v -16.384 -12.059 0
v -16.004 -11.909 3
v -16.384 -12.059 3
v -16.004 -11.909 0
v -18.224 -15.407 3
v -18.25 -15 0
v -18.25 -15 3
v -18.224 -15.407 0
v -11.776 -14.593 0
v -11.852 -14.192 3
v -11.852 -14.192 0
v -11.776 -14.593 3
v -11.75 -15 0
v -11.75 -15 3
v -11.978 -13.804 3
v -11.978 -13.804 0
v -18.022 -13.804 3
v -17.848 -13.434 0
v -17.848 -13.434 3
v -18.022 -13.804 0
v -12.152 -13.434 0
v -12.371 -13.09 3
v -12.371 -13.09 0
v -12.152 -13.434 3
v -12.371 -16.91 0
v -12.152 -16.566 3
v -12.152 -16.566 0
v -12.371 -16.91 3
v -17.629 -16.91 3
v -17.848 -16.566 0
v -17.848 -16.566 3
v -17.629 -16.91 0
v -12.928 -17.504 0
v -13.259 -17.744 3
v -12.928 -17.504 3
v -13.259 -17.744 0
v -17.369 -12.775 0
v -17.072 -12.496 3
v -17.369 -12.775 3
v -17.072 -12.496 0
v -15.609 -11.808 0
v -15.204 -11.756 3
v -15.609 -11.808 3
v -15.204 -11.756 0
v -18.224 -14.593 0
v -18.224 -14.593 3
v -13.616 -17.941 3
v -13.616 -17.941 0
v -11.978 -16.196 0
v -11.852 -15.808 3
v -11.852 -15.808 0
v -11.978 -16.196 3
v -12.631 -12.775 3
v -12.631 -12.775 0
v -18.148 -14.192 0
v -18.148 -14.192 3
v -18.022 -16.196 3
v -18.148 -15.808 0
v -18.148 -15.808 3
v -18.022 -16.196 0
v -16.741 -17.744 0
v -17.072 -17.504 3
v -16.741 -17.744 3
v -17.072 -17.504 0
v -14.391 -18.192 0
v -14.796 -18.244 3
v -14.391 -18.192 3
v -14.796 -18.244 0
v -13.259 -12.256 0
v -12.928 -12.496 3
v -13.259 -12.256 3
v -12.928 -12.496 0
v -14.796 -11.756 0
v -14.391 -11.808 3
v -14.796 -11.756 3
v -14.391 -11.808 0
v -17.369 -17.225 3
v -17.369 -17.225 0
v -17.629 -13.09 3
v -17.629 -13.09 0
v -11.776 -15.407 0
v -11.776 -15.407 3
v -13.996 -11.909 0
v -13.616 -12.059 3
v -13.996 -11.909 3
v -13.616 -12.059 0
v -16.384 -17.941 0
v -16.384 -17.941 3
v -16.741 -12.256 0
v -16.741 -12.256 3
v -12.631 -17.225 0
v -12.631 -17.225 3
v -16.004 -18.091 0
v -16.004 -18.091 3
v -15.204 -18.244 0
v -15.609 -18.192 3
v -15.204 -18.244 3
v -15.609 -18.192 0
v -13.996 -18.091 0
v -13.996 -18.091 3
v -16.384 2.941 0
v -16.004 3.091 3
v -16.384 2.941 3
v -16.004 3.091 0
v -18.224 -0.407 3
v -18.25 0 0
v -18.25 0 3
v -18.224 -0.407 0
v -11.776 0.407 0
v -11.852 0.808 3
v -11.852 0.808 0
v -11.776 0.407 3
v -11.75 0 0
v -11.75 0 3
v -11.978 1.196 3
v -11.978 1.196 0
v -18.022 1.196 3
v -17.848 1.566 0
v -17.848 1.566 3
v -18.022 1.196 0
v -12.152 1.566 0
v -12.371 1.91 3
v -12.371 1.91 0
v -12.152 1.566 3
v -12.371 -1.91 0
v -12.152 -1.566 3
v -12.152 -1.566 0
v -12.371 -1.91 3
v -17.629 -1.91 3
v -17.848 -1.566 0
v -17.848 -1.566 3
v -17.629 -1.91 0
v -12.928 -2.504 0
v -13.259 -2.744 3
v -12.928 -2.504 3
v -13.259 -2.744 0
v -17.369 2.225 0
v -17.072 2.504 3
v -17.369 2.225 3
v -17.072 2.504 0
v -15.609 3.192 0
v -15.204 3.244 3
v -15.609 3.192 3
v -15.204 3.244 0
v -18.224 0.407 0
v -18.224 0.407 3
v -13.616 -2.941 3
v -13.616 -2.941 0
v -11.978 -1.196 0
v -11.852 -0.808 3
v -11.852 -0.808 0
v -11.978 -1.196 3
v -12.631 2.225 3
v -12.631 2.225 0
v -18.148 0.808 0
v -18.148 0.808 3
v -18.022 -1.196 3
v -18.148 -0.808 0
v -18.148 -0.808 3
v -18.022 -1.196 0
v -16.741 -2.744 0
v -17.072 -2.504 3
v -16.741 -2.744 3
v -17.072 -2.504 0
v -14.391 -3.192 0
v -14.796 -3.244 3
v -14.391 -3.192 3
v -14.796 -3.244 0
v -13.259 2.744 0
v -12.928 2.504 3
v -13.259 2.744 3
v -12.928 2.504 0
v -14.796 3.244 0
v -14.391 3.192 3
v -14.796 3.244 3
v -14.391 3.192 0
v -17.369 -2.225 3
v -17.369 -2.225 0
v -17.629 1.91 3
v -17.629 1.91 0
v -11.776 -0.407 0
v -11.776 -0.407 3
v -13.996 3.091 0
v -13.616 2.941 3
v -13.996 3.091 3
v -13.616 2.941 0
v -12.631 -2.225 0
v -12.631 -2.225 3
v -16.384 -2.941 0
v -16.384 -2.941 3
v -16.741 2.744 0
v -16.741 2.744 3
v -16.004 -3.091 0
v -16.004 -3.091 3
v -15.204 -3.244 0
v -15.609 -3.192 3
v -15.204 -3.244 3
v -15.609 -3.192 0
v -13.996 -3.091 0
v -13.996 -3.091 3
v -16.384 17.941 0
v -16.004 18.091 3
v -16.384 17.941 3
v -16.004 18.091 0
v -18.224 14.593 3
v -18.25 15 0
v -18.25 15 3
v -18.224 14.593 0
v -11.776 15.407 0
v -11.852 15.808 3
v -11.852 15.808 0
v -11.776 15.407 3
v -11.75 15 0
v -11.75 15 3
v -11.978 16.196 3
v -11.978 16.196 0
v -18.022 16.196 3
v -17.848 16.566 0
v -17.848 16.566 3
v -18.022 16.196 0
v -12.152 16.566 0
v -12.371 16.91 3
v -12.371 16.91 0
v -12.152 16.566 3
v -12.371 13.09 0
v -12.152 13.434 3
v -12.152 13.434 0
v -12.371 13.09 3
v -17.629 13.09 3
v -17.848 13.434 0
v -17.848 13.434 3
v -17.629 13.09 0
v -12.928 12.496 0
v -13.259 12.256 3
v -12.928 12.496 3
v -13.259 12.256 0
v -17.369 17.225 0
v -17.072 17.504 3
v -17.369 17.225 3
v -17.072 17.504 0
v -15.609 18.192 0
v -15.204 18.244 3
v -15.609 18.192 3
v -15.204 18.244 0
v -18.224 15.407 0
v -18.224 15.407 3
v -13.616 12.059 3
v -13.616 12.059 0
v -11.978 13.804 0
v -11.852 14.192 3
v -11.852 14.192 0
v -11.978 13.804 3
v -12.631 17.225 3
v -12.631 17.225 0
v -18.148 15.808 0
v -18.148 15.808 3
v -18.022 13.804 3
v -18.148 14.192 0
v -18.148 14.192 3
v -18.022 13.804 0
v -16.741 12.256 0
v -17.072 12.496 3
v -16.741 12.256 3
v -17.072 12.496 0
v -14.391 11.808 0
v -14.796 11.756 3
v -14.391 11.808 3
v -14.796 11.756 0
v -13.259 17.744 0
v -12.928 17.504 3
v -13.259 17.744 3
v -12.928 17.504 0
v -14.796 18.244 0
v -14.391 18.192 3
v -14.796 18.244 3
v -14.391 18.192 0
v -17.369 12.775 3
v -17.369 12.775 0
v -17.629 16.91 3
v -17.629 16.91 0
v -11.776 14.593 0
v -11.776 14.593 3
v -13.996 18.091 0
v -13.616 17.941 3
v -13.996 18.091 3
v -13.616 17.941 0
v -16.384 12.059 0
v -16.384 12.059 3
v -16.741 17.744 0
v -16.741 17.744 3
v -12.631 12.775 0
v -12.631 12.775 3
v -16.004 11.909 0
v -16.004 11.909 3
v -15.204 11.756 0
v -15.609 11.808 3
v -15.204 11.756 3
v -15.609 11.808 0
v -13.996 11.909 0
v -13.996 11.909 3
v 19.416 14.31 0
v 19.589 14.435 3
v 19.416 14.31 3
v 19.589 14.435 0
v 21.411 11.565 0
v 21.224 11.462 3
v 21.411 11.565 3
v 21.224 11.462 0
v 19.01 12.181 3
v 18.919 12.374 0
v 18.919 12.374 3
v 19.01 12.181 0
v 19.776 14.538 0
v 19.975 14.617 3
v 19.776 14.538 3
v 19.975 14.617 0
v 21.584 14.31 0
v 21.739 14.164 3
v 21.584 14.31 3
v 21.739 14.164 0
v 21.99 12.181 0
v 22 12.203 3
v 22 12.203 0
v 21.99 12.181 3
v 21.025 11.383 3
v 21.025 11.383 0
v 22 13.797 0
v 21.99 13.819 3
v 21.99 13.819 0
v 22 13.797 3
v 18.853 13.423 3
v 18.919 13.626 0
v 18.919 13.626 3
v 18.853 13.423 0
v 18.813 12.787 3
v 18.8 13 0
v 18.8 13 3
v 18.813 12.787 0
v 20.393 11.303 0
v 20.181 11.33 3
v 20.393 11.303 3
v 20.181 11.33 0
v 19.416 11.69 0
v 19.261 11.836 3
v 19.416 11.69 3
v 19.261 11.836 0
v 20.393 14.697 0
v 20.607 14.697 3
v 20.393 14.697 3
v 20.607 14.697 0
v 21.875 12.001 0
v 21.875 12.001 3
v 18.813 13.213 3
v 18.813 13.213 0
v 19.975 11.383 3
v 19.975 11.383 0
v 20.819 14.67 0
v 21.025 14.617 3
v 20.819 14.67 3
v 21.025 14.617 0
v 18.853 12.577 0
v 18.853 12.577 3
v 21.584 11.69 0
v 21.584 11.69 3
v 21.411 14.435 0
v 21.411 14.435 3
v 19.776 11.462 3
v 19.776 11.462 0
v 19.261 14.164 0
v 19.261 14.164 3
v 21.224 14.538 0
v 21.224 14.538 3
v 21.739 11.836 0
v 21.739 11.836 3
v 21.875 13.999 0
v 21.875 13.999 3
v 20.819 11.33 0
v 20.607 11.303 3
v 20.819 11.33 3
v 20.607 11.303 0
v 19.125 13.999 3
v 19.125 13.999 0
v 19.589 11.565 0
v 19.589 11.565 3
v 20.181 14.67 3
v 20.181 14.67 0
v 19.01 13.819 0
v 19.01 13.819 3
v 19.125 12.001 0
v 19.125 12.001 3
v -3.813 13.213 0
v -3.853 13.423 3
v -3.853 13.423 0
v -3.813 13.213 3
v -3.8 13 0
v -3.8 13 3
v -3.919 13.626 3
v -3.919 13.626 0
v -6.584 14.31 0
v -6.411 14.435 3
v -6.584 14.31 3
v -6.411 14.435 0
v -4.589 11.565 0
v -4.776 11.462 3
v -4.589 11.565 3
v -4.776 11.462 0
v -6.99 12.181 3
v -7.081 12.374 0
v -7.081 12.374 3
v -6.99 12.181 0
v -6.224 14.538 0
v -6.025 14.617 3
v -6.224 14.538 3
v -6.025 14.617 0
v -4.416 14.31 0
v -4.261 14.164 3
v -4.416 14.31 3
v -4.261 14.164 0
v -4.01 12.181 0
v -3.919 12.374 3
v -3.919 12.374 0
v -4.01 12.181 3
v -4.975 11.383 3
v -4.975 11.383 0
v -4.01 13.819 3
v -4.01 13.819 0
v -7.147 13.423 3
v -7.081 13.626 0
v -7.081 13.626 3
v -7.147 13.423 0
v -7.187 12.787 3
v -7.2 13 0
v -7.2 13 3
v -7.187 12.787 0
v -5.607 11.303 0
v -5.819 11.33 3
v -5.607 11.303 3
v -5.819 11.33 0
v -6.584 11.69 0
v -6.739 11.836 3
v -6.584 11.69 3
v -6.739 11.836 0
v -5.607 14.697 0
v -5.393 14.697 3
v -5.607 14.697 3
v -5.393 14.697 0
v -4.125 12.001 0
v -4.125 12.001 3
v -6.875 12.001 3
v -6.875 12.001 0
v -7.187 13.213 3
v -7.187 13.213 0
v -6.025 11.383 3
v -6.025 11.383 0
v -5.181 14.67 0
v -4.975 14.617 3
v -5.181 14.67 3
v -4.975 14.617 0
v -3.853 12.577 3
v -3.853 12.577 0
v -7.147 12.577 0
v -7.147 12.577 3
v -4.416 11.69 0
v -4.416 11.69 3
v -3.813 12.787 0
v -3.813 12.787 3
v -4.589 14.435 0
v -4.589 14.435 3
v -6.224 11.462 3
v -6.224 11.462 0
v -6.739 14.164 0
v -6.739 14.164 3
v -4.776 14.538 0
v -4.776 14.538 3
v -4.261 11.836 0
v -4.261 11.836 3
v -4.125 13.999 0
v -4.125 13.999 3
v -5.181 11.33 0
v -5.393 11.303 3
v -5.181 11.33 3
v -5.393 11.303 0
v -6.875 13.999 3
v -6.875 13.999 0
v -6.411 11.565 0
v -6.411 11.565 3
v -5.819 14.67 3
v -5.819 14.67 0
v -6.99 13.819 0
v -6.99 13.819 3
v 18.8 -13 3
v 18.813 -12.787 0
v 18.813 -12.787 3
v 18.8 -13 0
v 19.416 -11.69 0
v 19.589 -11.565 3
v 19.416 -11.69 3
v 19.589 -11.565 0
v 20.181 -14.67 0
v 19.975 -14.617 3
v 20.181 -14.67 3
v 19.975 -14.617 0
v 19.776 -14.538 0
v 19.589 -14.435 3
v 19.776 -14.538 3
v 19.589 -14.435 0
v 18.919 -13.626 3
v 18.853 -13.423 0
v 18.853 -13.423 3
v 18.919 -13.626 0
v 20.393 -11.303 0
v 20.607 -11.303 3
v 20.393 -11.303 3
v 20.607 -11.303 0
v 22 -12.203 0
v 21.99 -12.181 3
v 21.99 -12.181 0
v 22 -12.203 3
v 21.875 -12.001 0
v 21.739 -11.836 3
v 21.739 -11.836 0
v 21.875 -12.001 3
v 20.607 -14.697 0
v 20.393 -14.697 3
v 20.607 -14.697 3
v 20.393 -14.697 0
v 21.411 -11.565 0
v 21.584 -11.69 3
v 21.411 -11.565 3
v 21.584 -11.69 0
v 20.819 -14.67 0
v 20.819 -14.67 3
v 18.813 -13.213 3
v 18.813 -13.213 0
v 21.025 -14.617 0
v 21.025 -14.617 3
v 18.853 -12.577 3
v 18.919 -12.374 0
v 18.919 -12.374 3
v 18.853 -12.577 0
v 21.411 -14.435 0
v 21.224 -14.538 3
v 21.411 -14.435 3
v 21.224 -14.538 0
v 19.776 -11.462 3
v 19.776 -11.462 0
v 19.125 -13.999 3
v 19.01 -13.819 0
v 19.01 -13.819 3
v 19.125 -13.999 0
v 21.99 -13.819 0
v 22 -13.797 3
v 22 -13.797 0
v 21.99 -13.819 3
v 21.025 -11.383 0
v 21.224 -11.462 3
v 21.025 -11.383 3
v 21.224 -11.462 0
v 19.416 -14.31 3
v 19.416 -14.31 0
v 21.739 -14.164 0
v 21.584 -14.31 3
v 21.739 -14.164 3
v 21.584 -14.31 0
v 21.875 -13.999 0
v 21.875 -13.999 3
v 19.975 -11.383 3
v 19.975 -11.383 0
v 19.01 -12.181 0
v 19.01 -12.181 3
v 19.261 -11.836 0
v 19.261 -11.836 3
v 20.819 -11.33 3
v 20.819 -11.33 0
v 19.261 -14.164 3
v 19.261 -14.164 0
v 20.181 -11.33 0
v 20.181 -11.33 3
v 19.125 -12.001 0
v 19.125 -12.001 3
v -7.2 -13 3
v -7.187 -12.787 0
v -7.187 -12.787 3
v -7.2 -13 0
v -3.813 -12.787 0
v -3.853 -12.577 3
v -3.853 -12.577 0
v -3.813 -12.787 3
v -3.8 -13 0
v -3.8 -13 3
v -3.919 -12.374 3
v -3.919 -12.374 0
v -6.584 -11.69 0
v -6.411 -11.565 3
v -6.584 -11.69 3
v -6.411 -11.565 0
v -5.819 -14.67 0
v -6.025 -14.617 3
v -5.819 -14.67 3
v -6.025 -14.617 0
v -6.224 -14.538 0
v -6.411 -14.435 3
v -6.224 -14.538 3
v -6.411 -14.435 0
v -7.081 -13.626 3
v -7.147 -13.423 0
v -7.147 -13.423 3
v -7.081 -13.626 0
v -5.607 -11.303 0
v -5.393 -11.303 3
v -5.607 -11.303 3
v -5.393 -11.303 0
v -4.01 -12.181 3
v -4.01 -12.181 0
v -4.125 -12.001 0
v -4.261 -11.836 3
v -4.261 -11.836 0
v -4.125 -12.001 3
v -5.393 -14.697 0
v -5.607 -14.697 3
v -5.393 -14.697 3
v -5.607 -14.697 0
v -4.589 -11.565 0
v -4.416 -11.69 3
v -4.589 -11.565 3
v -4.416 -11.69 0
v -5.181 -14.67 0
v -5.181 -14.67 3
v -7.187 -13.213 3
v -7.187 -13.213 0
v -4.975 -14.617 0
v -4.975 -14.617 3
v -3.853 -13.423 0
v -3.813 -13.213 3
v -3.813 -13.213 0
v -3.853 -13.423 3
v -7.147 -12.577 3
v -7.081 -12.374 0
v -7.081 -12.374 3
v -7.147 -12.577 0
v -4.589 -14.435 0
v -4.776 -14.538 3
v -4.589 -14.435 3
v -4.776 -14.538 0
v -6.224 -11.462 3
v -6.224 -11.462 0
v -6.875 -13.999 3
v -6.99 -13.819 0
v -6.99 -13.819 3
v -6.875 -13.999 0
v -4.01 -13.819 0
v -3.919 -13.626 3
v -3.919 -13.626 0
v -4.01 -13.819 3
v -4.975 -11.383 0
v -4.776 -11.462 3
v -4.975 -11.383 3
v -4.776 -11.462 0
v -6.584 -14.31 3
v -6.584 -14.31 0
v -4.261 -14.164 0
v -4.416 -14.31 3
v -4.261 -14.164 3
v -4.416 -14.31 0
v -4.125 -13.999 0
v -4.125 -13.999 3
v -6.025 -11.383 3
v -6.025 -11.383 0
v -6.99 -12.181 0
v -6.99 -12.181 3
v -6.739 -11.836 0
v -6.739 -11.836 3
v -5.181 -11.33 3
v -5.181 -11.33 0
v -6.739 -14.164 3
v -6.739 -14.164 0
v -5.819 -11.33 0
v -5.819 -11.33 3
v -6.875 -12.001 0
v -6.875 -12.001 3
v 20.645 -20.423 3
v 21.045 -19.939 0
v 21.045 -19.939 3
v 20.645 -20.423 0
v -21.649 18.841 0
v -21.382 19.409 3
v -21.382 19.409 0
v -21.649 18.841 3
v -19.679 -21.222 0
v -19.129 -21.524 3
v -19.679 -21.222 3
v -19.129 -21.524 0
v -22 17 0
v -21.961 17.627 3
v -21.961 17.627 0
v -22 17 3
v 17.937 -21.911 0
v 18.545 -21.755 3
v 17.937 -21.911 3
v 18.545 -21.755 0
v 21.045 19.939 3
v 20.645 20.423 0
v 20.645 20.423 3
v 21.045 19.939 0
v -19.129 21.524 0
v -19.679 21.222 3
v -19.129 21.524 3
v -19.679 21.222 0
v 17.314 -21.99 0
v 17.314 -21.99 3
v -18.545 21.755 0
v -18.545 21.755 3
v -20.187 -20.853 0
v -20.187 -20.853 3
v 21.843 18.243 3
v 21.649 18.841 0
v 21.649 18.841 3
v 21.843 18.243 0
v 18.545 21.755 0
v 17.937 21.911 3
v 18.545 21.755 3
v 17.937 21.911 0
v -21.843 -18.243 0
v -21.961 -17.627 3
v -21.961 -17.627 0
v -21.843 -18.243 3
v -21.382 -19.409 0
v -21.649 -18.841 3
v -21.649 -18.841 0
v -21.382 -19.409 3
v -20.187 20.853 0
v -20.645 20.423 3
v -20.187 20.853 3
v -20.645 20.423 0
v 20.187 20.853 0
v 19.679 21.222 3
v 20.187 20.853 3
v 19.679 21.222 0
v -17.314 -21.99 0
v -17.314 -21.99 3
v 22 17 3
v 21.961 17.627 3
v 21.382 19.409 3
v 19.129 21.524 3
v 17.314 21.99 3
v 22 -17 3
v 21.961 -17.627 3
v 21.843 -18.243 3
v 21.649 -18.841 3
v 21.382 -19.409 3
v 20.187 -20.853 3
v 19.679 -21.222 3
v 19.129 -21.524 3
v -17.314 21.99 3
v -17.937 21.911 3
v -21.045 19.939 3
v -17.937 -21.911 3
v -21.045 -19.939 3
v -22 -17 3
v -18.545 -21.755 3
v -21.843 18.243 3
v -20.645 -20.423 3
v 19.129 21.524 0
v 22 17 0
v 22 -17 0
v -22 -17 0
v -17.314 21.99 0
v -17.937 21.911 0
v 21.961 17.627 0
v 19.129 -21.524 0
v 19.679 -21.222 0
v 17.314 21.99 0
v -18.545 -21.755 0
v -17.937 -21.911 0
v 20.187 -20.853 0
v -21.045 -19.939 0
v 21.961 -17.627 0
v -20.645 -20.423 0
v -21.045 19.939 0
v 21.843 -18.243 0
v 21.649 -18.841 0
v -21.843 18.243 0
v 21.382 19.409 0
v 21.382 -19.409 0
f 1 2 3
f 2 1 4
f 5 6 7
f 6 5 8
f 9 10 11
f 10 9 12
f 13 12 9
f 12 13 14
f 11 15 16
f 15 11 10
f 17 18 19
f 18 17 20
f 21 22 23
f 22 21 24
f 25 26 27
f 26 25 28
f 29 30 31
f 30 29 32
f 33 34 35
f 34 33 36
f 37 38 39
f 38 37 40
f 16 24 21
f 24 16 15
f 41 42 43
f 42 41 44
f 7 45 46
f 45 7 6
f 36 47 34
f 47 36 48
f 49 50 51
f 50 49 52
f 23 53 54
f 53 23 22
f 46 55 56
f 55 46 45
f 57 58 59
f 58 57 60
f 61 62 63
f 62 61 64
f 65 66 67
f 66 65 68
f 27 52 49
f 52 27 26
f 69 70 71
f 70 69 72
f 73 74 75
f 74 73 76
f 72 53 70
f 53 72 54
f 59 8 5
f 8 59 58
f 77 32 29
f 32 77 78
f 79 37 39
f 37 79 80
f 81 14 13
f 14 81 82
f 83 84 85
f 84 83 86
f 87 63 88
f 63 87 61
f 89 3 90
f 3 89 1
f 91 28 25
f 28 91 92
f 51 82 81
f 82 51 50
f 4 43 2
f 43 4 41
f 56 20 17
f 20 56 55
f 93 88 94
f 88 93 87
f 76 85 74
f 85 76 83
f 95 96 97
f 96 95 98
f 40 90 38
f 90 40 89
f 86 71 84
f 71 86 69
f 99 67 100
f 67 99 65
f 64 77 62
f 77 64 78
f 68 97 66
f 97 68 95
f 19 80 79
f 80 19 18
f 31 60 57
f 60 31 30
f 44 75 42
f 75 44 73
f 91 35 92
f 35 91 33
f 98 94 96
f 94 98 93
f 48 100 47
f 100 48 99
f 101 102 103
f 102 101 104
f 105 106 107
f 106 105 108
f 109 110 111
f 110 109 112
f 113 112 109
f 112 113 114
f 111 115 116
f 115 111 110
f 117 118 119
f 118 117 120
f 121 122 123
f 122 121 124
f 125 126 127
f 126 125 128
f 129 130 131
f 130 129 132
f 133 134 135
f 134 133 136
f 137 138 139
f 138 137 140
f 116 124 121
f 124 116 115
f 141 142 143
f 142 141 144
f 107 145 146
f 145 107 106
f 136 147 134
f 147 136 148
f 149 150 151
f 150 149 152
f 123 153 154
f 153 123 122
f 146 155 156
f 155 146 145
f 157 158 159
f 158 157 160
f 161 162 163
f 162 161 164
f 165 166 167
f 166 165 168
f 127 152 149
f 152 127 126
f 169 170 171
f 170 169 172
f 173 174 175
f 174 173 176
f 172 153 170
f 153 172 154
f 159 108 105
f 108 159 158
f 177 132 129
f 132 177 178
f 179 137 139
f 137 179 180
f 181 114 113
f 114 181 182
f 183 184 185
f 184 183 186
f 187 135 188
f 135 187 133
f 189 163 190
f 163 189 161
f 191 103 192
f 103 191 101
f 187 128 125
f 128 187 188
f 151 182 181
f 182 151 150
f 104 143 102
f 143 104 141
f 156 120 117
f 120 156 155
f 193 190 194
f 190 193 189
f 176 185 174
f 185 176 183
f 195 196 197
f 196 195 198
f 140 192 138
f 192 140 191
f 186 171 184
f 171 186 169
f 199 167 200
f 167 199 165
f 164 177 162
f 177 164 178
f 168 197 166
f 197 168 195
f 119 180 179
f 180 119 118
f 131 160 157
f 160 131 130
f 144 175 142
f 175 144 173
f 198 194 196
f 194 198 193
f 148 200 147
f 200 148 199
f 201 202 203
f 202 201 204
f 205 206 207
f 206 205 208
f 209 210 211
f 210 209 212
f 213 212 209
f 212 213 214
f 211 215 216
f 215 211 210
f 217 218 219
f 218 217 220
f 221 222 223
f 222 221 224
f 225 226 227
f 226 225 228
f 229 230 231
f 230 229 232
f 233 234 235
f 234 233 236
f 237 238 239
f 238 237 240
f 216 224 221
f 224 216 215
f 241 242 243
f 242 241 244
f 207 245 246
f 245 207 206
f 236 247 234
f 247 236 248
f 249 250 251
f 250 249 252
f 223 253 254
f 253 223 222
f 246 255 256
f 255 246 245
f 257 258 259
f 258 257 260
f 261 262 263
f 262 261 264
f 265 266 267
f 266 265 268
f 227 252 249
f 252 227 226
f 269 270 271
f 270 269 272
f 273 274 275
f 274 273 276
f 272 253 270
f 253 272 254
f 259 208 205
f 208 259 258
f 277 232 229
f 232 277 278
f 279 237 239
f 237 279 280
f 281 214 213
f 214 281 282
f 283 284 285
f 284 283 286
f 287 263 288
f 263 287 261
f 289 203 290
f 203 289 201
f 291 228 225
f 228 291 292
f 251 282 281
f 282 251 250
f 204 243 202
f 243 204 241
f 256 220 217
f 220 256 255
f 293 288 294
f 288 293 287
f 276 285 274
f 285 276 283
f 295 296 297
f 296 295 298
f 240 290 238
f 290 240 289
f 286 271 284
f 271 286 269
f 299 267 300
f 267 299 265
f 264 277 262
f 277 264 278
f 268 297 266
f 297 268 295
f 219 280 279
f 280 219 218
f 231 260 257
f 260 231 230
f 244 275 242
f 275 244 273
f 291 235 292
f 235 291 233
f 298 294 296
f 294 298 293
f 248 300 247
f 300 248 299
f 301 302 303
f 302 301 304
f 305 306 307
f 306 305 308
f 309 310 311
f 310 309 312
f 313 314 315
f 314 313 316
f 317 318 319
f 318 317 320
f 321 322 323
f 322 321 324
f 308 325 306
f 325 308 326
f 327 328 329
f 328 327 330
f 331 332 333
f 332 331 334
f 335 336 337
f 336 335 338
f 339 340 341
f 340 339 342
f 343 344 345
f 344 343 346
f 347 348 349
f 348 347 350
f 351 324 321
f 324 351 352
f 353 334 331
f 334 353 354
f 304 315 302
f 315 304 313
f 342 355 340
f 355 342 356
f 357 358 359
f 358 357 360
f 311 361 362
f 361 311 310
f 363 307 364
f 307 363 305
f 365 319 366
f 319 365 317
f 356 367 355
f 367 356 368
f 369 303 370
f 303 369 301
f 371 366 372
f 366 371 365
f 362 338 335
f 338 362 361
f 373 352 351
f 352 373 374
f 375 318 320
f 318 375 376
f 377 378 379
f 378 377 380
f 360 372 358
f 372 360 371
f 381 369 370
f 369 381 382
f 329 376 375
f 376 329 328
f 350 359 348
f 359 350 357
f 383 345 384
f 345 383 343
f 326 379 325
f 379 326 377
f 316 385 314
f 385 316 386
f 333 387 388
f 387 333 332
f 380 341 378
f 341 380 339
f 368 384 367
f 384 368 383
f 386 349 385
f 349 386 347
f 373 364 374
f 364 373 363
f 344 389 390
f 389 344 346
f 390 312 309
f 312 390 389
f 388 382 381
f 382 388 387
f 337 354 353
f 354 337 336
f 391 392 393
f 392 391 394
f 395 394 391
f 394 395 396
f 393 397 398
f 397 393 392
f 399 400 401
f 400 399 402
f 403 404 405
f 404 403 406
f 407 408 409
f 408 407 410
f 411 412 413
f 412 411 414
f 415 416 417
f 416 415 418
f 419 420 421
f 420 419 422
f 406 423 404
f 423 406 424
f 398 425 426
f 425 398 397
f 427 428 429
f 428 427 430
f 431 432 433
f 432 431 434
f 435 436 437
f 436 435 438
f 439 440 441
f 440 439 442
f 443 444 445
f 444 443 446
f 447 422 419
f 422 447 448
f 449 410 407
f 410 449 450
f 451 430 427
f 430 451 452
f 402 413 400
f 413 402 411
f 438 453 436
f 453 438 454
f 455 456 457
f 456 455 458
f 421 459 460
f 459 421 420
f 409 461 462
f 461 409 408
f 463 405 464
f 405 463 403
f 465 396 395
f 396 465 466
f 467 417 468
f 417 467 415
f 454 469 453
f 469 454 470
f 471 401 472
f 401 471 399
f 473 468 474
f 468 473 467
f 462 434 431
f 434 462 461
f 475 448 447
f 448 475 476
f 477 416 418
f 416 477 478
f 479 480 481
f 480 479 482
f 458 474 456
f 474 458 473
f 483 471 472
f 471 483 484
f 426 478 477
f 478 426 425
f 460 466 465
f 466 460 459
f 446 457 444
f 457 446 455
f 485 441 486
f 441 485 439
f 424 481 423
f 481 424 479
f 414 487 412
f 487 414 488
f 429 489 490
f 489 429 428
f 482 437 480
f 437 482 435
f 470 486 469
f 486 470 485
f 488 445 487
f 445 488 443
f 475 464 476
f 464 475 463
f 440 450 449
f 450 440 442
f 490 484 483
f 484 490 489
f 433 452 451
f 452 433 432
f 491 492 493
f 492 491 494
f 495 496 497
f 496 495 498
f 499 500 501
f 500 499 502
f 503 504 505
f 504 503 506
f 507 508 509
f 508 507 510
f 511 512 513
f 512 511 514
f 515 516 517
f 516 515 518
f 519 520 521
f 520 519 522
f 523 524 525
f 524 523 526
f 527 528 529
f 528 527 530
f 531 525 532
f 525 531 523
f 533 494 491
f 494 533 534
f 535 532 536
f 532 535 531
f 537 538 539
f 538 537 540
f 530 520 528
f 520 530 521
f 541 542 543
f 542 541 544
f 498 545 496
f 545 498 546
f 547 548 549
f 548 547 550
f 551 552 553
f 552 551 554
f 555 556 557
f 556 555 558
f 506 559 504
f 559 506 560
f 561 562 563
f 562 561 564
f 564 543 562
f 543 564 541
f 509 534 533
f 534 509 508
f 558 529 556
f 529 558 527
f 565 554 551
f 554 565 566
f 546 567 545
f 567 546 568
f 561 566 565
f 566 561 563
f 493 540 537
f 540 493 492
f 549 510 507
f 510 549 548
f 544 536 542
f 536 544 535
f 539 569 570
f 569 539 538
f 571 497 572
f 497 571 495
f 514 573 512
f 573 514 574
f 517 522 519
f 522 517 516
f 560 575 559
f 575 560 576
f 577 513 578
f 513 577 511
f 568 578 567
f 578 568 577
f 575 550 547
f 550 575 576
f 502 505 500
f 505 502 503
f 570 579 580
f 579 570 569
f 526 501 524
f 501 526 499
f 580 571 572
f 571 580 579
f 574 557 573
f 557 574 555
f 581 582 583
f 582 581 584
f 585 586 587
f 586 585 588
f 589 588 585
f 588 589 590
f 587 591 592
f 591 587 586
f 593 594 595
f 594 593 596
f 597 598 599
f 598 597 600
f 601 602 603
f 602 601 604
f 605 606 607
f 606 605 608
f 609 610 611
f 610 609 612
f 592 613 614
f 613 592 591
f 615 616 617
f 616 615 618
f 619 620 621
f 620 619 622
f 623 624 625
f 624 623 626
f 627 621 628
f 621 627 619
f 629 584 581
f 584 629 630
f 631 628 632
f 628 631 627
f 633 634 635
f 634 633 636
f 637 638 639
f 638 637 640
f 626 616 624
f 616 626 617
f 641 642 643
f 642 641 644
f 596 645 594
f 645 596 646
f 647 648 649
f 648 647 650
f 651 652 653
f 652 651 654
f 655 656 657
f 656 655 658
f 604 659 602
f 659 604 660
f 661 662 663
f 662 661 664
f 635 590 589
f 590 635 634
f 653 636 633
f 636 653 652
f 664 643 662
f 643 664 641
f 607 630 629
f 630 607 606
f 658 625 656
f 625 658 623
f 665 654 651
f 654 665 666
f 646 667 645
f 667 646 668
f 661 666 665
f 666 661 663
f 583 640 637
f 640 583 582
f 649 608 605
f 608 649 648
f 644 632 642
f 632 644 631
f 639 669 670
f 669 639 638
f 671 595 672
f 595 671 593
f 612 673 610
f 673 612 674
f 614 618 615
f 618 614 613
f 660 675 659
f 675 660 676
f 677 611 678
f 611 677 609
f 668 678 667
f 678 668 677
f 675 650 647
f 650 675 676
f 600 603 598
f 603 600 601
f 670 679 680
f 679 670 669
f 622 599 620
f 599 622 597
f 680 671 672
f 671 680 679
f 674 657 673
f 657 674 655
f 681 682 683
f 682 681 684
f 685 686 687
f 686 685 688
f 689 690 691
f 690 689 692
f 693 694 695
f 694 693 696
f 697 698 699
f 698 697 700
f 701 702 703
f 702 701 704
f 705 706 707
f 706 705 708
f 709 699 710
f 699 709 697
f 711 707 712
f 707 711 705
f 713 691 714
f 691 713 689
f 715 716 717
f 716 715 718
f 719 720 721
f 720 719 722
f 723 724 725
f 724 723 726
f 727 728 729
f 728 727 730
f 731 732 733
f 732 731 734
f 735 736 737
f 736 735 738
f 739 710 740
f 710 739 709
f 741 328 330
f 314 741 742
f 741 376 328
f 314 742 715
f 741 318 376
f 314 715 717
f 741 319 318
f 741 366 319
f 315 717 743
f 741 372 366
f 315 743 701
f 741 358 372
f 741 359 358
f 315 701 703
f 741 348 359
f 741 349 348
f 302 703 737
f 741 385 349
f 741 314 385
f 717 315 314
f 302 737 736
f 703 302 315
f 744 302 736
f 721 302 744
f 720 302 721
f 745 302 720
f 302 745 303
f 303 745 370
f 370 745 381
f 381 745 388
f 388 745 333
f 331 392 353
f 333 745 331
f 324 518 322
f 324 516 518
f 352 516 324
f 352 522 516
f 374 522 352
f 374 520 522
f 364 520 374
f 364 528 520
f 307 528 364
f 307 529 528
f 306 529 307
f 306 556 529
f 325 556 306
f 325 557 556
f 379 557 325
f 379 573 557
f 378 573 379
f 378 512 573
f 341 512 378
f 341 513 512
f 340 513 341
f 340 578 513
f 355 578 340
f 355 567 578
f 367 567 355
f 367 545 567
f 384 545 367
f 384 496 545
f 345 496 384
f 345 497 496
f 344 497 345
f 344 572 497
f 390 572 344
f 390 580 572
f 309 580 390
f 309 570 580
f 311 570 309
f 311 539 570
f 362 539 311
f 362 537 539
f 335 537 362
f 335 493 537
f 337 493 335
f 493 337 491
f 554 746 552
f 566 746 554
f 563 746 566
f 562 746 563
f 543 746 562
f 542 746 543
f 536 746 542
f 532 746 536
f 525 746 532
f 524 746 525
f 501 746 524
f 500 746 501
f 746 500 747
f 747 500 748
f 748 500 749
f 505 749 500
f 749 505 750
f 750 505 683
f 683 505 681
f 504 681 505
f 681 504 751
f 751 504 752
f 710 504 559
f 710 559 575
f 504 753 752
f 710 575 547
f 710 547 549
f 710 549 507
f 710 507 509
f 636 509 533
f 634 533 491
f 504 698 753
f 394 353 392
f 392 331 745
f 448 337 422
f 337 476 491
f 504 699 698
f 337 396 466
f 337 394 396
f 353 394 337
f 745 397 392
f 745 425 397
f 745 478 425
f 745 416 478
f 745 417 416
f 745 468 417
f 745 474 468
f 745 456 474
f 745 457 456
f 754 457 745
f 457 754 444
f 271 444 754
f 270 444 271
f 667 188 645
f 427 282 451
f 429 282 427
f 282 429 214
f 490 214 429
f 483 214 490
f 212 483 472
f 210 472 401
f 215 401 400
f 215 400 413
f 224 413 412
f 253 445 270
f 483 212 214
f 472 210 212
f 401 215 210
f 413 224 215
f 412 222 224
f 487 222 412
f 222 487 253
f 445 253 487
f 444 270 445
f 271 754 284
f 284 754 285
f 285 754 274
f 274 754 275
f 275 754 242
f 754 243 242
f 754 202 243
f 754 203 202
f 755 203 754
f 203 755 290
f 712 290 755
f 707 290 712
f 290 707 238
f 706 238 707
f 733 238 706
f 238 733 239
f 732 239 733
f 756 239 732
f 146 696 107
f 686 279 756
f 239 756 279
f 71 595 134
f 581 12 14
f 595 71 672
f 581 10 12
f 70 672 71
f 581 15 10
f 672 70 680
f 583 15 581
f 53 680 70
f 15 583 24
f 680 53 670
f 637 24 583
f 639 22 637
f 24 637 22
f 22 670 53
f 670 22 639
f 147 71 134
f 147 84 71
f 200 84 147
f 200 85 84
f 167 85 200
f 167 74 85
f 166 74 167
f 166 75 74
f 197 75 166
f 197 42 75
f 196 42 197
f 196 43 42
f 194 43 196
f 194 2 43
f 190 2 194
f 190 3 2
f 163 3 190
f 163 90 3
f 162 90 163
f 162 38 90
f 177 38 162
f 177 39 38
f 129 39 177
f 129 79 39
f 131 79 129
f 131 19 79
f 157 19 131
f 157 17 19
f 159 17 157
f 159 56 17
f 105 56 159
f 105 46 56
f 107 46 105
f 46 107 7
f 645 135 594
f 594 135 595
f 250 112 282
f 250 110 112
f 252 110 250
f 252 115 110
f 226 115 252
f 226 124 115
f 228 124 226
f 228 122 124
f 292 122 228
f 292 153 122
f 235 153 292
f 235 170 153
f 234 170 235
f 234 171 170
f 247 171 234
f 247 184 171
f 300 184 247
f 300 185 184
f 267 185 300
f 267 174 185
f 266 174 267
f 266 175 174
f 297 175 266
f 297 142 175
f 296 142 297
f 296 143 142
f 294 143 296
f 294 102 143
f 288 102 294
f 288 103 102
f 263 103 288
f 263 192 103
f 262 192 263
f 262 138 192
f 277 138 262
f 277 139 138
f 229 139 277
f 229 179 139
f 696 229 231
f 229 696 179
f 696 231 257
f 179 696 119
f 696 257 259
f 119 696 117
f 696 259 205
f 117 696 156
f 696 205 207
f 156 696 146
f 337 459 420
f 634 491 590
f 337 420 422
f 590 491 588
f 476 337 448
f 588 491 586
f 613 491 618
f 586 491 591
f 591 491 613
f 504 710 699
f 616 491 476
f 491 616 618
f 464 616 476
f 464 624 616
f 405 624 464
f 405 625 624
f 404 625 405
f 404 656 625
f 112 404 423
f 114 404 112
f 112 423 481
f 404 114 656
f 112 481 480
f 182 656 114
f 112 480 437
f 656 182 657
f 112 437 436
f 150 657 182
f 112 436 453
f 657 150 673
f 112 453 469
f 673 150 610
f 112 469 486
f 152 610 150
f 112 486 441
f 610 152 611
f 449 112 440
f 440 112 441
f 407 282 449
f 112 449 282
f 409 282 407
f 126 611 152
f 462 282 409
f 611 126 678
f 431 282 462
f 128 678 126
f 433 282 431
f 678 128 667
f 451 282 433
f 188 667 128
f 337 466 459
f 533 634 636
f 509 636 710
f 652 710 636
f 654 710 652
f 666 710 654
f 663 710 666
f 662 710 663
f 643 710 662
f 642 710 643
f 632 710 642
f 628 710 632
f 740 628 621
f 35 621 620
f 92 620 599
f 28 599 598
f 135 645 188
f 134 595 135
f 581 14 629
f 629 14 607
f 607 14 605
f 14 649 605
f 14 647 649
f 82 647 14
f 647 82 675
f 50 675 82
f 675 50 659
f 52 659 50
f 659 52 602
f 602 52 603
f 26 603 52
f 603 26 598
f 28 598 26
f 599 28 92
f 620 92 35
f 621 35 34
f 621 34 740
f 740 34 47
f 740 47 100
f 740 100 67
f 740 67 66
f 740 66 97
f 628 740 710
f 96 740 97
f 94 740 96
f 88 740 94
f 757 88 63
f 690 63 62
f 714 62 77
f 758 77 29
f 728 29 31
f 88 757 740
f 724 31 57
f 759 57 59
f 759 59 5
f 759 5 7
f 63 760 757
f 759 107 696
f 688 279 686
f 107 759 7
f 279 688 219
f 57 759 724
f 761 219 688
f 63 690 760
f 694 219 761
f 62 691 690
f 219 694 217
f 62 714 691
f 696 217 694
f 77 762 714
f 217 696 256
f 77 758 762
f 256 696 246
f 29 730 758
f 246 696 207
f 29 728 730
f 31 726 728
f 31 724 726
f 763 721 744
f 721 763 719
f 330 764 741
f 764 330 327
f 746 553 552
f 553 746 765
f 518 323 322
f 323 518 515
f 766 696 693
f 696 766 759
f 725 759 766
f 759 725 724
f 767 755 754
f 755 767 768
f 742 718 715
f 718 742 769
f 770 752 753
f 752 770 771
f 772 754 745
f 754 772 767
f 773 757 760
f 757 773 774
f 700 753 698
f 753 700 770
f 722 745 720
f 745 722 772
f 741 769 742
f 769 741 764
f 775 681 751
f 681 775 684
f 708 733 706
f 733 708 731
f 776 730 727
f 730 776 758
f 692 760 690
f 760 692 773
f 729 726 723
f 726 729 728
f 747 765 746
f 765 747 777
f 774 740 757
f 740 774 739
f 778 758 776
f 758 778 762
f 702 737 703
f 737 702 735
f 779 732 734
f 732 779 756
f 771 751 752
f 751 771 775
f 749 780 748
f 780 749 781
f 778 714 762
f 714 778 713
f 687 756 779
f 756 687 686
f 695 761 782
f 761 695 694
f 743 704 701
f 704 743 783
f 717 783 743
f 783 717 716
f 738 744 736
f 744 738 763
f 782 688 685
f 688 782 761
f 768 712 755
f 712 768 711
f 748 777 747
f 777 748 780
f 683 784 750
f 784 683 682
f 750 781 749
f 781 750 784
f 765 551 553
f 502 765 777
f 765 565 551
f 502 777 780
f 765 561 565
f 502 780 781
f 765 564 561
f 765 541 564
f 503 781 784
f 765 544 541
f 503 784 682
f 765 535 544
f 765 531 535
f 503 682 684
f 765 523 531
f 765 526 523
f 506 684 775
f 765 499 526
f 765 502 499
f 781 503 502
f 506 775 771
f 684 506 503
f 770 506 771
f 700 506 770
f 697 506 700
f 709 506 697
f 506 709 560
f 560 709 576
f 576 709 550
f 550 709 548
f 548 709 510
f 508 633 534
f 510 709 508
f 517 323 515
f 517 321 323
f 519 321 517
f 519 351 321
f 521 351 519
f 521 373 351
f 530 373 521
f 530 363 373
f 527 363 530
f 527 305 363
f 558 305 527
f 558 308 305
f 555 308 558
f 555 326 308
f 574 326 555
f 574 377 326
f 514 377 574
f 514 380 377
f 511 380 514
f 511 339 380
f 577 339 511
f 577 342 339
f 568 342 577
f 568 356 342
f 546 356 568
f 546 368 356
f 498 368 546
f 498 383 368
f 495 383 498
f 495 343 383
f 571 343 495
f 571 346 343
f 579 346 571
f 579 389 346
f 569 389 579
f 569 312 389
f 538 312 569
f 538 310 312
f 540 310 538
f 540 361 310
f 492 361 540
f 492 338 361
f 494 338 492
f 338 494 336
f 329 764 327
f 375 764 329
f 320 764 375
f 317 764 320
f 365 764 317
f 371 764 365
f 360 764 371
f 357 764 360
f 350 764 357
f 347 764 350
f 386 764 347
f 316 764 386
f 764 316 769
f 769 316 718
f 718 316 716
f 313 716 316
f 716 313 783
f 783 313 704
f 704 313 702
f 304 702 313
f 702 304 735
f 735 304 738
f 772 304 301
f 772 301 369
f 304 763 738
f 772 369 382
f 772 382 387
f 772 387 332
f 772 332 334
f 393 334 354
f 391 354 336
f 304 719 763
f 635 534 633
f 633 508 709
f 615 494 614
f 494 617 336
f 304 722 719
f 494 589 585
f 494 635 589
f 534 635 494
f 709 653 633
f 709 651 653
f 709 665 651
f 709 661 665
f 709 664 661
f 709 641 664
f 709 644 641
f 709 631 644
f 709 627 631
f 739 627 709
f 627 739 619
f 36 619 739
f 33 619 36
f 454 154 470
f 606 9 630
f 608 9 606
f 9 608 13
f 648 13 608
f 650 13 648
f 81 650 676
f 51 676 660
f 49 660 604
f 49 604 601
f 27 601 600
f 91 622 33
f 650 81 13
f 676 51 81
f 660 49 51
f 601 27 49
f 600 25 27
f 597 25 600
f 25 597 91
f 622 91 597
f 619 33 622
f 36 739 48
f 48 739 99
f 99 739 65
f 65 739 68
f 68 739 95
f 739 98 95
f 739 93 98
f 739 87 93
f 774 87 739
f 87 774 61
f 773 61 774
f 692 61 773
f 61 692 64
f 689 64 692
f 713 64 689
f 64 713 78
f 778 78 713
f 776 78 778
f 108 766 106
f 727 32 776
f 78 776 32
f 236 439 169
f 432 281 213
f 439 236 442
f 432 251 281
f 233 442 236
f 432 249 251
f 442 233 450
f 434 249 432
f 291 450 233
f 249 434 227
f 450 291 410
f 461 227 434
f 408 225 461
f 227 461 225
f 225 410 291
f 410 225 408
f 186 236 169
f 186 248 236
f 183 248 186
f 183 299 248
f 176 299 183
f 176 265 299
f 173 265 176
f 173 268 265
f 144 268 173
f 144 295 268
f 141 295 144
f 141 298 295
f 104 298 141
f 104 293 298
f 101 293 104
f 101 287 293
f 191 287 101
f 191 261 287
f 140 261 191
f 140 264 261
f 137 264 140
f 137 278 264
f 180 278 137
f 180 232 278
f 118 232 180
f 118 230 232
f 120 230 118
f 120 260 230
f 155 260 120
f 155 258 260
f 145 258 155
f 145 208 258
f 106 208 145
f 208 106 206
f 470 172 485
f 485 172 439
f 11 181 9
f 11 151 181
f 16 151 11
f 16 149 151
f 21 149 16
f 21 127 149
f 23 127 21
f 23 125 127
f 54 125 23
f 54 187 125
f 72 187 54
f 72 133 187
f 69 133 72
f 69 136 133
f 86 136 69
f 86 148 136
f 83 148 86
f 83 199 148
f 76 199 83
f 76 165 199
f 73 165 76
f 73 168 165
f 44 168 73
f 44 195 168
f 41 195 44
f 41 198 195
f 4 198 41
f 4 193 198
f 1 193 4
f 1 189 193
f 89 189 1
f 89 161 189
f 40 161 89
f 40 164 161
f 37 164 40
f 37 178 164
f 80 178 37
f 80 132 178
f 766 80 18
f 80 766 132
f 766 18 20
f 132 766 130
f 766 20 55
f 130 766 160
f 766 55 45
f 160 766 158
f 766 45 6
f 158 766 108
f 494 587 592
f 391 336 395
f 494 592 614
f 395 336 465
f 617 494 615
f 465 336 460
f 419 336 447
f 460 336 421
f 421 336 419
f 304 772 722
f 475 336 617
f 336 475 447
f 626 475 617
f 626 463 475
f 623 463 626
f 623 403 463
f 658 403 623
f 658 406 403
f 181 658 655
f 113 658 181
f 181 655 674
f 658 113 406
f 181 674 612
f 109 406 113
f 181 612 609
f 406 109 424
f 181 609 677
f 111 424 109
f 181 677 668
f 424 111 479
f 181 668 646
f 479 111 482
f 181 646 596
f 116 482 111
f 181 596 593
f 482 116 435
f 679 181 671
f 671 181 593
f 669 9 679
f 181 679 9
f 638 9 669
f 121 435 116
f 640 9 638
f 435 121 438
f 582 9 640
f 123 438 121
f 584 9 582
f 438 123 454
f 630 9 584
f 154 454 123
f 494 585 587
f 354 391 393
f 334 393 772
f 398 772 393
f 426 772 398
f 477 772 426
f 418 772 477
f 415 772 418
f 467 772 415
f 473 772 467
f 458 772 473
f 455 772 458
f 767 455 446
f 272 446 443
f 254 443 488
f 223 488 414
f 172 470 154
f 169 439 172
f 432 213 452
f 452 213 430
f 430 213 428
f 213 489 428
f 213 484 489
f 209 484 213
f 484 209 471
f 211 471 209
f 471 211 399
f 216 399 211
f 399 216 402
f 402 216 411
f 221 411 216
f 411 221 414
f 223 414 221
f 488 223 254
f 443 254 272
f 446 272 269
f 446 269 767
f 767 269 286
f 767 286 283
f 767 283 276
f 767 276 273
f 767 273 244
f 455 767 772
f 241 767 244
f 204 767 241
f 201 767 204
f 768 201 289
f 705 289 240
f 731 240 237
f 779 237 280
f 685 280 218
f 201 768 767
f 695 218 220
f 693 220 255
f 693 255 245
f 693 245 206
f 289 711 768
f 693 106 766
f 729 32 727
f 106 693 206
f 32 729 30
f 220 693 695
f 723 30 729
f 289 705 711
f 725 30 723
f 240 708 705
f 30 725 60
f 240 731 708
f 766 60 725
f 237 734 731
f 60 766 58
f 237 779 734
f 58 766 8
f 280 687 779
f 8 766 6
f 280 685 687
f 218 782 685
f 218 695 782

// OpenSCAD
$fn = 50;


difference() {
	union() {
		translate(v = [0, 0, 0]) {
			rotate(a = [0, 0, 0]) {
				hull() {
					translate(v = [-17.0000000000, 17.0000000000, 0]) {
						rotate(a = [0, 0, 0]) {
							translate(v = [0, 0, 0]) {
								rotate(a = [0, 0, 0]) {
									cylinder(h = 3, r = 5);
								}
							}
						}
					}
					translate(v = [17.0000000000, 17.0000000000, 0]) {
						rotate(a = [0, 0, 0]) {
							translate(v = [0, 0, 0]) {
								rotate(a = [0, 0, 0]) {
									cylinder(h = 3, r = 5);
								}
							}
						}
					}
					translate(v = [-17.0000000000, -17.0000000000, 0]) {
						rotate(a = [0, 0, 0]) {
							translate(v = [0, 0, 0]) {
								rotate(a = [0, 0, 0]) {
									cylinder(h = 3, r = 5);
								}
							}
						}
					}
					translate(v = [17.0000000000, -17.0000000000, 0]) {
						rotate(a = [0, 0, 0]) {
							translate(v = [0, 0, 0]) {
								rotate(a = [0, 0, 0]) {
									cylinder(h = 3, r = 5);
								}
							}
						}
					}
				}
			}
		}
	}
	union() {
		translate(v = [-15.0000000000, -15.0000000000, -125.0000000000]) {
			rotate(a = [0, 0, 0]) {
				cylinder(h = 250, r = 3.2500000000);
			}
		}
		translate(v = [-15.0000000000, 0.0000000000, -125.0000000000]) {
			rotate(a = [0, 0, 0]) {
				cylinder(h = 250, r = 3.2500000000);
			}
		}
		translate(v = [-15.0000000000, 15.0000000000, -125.0000000000]) {
			rotate(a = [0, 0, 0]) {
				cylinder(h = 250, r = 3.2500000000);
			}
		}
		translate(v = [20.5000000000, 13.0000000000, -125.0000000000]) {
			rotate(a = [0, 0, 0]) {
				cylinder(h = 250, r = 1.7000000000);
			}
		}
		translate(v = [-5.5000000000, 13.0000000000, -125.0000000000]) {
			rotate(a = [0, 0, 0]) {
				cylinder(h = 250, r = 1.7000000000);
			}
		}
		translate(v = [20.5000000000, -13.0000000000, -125.0000000000]) {
			rotate(a = [0, 0, 0]) {
				cylinder(h = 250, r = 1.7000000000);
			}
		}
		translate(v = [-5.5000000000, -13.0000000000, -125.0000000000]) {
			rotate(a = [0, 0, 0]) {
				cylinder(h = 250, r = 1.7000000000);
			}
		}
	}
}
